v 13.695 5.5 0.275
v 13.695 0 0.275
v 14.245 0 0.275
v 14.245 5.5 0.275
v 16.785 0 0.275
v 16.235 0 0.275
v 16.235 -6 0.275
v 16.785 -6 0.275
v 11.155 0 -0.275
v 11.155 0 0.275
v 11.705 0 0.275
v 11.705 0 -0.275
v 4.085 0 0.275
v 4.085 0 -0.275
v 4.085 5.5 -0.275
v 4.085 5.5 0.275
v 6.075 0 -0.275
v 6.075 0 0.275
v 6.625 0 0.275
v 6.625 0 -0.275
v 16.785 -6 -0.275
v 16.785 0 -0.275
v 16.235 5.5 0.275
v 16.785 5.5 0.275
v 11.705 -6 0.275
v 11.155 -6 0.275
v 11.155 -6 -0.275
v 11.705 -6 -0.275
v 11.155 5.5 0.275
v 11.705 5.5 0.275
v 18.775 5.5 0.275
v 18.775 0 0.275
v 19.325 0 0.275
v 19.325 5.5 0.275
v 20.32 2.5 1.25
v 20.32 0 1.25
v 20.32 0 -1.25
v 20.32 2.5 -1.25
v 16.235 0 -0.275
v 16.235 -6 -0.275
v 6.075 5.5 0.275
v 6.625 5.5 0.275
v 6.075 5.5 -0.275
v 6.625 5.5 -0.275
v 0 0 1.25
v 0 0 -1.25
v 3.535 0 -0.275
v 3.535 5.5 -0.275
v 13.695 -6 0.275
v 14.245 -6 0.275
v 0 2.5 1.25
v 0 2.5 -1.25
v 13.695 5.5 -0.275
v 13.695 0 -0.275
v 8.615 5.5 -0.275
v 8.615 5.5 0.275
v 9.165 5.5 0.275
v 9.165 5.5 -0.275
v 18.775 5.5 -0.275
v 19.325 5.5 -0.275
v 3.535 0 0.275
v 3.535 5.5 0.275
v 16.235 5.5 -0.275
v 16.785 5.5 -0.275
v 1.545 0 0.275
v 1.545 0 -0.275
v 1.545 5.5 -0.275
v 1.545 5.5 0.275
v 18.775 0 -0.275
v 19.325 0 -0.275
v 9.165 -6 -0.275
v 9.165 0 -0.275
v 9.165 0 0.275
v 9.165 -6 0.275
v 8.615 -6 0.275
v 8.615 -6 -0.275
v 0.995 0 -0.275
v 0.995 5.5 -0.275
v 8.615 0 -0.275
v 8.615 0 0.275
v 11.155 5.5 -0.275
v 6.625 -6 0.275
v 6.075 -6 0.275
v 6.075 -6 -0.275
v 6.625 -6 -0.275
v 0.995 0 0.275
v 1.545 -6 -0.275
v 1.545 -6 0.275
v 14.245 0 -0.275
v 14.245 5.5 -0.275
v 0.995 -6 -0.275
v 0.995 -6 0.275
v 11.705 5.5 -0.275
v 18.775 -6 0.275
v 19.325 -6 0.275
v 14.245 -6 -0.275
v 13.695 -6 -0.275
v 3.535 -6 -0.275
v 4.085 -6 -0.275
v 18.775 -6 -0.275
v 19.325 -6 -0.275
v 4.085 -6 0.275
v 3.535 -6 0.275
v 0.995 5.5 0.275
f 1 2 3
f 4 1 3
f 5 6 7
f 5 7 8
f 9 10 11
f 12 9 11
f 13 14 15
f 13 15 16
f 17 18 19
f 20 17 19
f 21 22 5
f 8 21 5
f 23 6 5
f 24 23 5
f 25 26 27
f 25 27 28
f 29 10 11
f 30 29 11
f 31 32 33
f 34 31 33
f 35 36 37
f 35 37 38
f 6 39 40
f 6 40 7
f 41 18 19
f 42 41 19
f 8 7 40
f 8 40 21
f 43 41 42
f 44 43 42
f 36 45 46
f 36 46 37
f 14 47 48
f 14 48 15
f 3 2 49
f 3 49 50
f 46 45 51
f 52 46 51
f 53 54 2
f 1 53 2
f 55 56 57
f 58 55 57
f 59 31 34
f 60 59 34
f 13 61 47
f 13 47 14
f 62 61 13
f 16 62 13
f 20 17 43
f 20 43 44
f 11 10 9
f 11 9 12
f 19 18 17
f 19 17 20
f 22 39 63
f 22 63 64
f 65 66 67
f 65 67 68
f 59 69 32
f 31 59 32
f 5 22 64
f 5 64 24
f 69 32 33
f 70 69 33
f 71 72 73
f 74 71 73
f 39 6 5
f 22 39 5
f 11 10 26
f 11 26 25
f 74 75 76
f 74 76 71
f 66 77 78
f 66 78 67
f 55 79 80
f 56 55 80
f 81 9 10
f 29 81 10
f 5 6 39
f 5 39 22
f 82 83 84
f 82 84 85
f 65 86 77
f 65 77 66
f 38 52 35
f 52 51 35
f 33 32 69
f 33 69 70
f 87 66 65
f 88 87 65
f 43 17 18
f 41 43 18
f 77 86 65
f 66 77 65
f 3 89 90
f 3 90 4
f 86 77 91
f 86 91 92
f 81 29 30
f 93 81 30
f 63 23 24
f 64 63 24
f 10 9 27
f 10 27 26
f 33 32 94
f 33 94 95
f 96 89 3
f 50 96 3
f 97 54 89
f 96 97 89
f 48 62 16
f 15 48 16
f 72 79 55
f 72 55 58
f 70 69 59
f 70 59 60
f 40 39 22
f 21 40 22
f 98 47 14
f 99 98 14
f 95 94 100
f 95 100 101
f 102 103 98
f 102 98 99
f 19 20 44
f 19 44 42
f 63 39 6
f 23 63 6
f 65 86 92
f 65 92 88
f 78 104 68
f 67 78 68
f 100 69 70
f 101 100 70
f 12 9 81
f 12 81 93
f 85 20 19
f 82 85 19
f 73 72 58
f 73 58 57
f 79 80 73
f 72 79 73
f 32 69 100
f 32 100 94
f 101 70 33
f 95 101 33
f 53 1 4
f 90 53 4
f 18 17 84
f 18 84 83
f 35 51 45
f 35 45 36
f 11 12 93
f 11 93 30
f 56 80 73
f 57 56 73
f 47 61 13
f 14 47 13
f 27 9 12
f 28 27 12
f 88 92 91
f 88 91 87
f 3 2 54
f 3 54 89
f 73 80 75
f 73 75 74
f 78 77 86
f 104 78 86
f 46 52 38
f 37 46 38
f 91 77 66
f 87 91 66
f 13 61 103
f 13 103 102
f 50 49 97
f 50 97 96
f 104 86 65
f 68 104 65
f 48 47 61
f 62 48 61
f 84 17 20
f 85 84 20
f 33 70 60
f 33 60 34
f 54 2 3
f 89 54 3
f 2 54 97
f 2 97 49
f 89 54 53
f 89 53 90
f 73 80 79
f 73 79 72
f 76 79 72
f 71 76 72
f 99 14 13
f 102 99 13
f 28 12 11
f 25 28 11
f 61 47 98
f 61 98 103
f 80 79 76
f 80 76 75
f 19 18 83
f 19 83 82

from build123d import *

# Parameters (mm, degrees)
SKETCH1_W             = 20.32
SKETCH1_H             = 2.5
BOSS_EXTRUDE1_DEPTH   = 1.25
SKETCH2_W             = 0.55
SKETCH2_H             = 0.55
BOSS_EXTRUDE2_DEPTH   = 6
BOSS_EXTRUDE2_2_DEPTH = 6
BOSS_EXTRUDE2_3_DEPTH = 6
BOSS_EXTRUDE2_4_DEPTH = 6
BOSS_EXTRUDE2_5_DEPTH = 6
BOSS_EXTRUDE2_6_DEPTH = 6
BOSS_EXTRUDE2_7_DEPTH = 6
BOSS_EXTRUDE2_8_DEPTH = 6
SKETCH2_2_W           = 0.55
SKETCH2_2_H           = 0.55
BOSS_EXTRUDE3_DEPTH   = 5.5
BOSS_EXTRUDE3_2_DEPTH = 5.5
BOSS_EXTRUDE3_3_DEPTH = 5.5
BOSS_EXTRUDE3_4_DEPTH = 5.5
BOSS_EXTRUDE3_5_DEPTH = 5.5
BOSS_EXTRUDE3_6_DEPTH = 5.5
BOSS_EXTRUDE3_7_DEPTH = 5.5
BOSS_EXTRUDE3_8_DEPTH = 5.5


with BuildPart() as part:
    # Sketch1 → Boss-Extrude1 (new, symmetric)
    with BuildSketch(Plane.XY):
        with Locations((10.16, 1.25)):
            Rectangle(SKETCH1_W, SKETCH1_H)
    extrude(amount=BOSS_EXTRUDE1_DEPTH, both=True)


with BuildPart() as body_2:
    # Sketch2 → Boss-Extrude2 (new body)
    with BuildSketch(Plane.XZ):
        with Locations((3.81, 0)):
            Rectangle(SKETCH2_W, SKETCH2_H)
    extrude(amount=BOSS_EXTRUDE2_DEPTH)


with BuildPart() as body_3:
    # Sketch2 → Boss-Extrude2 2 (new body)
    with BuildSketch(Plane.XZ):
        with Locations((1.27, 0)):
            Rectangle(SKETCH2_W, SKETCH2_H)
    extrude(amount=BOSS_EXTRUDE2_2_DEPTH)


with BuildPart() as body_4:
    # Sketch2 → Boss-Extrude2 3 (new body)
    with BuildSketch(Plane.XZ):
        with Locations((6.35, 0)):
            Rectangle(SKETCH2_W, SKETCH2_H)
    extrude(amount=BOSS_EXTRUDE2_3_DEPTH)


with BuildPart() as body_5:
    # Sketch2 → Boss-Extrude2 4 (new body)
    with BuildSketch(Plane.XZ):
        with Locations((8.89, 0)):
            Rectangle(SKETCH2_W, SKETCH2_H)
    extrude(amount=BOSS_EXTRUDE2_4_DEPTH)


with BuildPart() as body_6:
    # Sketch2 → Boss-Extrude2 5 (new body)
    with BuildSketch(Plane.XZ):
        with Locations((11.43, 0)):
            Rectangle(SKETCH2_W, SKETCH2_H)
    extrude(amount=BOSS_EXTRUDE2_5_DEPTH)


with BuildPart() as body_7:
    # Sketch2 → Boss-Extrude2 6 (new body)
    with BuildSketch(Plane.XZ):
        with Locations((13.97, 0)):
            Rectangle(SKETCH2_W, SKETCH2_H)
    extrude(amount=BOSS_EXTRUDE2_6_DEPTH)


with BuildPart() as body_8:
    # Sketch2 → Boss-Extrude2 7 (new body)
    with BuildSketch(Plane.XZ):
        with Locations((16.51, 0)):
            Rectangle(SKETCH2_W, SKETCH2_H)
    extrude(amount=BOSS_EXTRUDE2_7_DEPTH)


with BuildPart() as body_9:
    # Sketch2 → Boss-Extrude2 8 (new body)
    with BuildSketch(Plane.XZ):
        with Locations((19.05, 0)):
            Rectangle(SKETCH2_W, SKETCH2_H)
    extrude(amount=BOSS_EXTRUDE2_8_DEPTH)


with BuildPart() as body_10:
    # Sketch2<2> → Boss-Extrude3 (new body)
    with BuildSketch(Plane.XZ):
        with Locations((3.81, 0)):
            Rectangle(SKETCH2_2_W, SKETCH2_2_H)
    extrude(amount=-BOSS_EXTRUDE3_DEPTH)


with BuildPart() as body_11:
    # Sketch2<2> → Boss-Extrude3 2 (new body)
    with BuildSketch(Plane.XZ):
        with Locations((1.27, 0)):
            Rectangle(SKETCH2_2_W, SKETCH2_2_H)
    extrude(amount=-BOSS_EXTRUDE3_2_DEPTH)


with BuildPart() as body_12:
    # Sketch2<2> → Boss-Extrude3 3 (new body)
    with BuildSketch(Plane.XZ):
        with Locations((6.35, 0)):
            Rectangle(SKETCH2_2_W, SKETCH2_2_H)
    extrude(amount=-BOSS_EXTRUDE3_3_DEPTH)


with BuildPart() as body_13:
    # Sketch2<2> → Boss-Extrude3 4 (new body)
    with BuildSketch(Plane.XZ):
        with Locations((8.89, 0)):
            Rectangle(SKETCH2_2_W, SKETCH2_2_H)
    extrude(amount=-BOSS_EXTRUDE3_4_DEPTH)


with BuildPart() as body_14:
    # Sketch2<2> → Boss-Extrude3 5 (new body)
    with BuildSketch(Plane.XZ):
        with Locations((11.43, 0)):
            Rectangle(SKETCH2_2_W, SKETCH2_2_H)
    extrude(amount=-BOSS_EXTRUDE3_5_DEPTH)


with BuildPart() as body_15:
    # Sketch2<2> → Boss-Extrude3 6 (new body)
    with BuildSketch(Plane.XZ):
        with Locations((13.97, 0)):
            Rectangle(SKETCH2_2_W, SKETCH2_2_H)
    extrude(amount=-BOSS_EXTRUDE3_6_DEPTH)


with BuildPart() as body_16:
    # Sketch2<2> → Boss-Extrude3 7 (new body)
    with BuildSketch(Plane.XZ):
        with Locations((16.51, 0)):
            Rectangle(SKETCH2_2_W, SKETCH2_2_H)
    extrude(amount=-BOSS_EXTRUDE3_7_DEPTH)


with BuildPart() as body_17:
    # Sketch2<2> → Boss-Extrude3 8 (new body)
    with BuildSketch(Plane.XZ):
        with Locations((19.05, 0)):
            Rectangle(SKETCH2_2_W, SKETCH2_2_H)
    extrude(amount=-BOSS_EXTRUDE3_8_DEPTH)


solid = Compound([part.part, body_2.part, body_3.part, body_4.part, body_5.part, body_6.part, body_7.part, body_8.part, body_9.part, body_10.part, body_11.part, body_12.part, body_13.part, body_14.part, body_15.part, body_16.part, body_17.part])
